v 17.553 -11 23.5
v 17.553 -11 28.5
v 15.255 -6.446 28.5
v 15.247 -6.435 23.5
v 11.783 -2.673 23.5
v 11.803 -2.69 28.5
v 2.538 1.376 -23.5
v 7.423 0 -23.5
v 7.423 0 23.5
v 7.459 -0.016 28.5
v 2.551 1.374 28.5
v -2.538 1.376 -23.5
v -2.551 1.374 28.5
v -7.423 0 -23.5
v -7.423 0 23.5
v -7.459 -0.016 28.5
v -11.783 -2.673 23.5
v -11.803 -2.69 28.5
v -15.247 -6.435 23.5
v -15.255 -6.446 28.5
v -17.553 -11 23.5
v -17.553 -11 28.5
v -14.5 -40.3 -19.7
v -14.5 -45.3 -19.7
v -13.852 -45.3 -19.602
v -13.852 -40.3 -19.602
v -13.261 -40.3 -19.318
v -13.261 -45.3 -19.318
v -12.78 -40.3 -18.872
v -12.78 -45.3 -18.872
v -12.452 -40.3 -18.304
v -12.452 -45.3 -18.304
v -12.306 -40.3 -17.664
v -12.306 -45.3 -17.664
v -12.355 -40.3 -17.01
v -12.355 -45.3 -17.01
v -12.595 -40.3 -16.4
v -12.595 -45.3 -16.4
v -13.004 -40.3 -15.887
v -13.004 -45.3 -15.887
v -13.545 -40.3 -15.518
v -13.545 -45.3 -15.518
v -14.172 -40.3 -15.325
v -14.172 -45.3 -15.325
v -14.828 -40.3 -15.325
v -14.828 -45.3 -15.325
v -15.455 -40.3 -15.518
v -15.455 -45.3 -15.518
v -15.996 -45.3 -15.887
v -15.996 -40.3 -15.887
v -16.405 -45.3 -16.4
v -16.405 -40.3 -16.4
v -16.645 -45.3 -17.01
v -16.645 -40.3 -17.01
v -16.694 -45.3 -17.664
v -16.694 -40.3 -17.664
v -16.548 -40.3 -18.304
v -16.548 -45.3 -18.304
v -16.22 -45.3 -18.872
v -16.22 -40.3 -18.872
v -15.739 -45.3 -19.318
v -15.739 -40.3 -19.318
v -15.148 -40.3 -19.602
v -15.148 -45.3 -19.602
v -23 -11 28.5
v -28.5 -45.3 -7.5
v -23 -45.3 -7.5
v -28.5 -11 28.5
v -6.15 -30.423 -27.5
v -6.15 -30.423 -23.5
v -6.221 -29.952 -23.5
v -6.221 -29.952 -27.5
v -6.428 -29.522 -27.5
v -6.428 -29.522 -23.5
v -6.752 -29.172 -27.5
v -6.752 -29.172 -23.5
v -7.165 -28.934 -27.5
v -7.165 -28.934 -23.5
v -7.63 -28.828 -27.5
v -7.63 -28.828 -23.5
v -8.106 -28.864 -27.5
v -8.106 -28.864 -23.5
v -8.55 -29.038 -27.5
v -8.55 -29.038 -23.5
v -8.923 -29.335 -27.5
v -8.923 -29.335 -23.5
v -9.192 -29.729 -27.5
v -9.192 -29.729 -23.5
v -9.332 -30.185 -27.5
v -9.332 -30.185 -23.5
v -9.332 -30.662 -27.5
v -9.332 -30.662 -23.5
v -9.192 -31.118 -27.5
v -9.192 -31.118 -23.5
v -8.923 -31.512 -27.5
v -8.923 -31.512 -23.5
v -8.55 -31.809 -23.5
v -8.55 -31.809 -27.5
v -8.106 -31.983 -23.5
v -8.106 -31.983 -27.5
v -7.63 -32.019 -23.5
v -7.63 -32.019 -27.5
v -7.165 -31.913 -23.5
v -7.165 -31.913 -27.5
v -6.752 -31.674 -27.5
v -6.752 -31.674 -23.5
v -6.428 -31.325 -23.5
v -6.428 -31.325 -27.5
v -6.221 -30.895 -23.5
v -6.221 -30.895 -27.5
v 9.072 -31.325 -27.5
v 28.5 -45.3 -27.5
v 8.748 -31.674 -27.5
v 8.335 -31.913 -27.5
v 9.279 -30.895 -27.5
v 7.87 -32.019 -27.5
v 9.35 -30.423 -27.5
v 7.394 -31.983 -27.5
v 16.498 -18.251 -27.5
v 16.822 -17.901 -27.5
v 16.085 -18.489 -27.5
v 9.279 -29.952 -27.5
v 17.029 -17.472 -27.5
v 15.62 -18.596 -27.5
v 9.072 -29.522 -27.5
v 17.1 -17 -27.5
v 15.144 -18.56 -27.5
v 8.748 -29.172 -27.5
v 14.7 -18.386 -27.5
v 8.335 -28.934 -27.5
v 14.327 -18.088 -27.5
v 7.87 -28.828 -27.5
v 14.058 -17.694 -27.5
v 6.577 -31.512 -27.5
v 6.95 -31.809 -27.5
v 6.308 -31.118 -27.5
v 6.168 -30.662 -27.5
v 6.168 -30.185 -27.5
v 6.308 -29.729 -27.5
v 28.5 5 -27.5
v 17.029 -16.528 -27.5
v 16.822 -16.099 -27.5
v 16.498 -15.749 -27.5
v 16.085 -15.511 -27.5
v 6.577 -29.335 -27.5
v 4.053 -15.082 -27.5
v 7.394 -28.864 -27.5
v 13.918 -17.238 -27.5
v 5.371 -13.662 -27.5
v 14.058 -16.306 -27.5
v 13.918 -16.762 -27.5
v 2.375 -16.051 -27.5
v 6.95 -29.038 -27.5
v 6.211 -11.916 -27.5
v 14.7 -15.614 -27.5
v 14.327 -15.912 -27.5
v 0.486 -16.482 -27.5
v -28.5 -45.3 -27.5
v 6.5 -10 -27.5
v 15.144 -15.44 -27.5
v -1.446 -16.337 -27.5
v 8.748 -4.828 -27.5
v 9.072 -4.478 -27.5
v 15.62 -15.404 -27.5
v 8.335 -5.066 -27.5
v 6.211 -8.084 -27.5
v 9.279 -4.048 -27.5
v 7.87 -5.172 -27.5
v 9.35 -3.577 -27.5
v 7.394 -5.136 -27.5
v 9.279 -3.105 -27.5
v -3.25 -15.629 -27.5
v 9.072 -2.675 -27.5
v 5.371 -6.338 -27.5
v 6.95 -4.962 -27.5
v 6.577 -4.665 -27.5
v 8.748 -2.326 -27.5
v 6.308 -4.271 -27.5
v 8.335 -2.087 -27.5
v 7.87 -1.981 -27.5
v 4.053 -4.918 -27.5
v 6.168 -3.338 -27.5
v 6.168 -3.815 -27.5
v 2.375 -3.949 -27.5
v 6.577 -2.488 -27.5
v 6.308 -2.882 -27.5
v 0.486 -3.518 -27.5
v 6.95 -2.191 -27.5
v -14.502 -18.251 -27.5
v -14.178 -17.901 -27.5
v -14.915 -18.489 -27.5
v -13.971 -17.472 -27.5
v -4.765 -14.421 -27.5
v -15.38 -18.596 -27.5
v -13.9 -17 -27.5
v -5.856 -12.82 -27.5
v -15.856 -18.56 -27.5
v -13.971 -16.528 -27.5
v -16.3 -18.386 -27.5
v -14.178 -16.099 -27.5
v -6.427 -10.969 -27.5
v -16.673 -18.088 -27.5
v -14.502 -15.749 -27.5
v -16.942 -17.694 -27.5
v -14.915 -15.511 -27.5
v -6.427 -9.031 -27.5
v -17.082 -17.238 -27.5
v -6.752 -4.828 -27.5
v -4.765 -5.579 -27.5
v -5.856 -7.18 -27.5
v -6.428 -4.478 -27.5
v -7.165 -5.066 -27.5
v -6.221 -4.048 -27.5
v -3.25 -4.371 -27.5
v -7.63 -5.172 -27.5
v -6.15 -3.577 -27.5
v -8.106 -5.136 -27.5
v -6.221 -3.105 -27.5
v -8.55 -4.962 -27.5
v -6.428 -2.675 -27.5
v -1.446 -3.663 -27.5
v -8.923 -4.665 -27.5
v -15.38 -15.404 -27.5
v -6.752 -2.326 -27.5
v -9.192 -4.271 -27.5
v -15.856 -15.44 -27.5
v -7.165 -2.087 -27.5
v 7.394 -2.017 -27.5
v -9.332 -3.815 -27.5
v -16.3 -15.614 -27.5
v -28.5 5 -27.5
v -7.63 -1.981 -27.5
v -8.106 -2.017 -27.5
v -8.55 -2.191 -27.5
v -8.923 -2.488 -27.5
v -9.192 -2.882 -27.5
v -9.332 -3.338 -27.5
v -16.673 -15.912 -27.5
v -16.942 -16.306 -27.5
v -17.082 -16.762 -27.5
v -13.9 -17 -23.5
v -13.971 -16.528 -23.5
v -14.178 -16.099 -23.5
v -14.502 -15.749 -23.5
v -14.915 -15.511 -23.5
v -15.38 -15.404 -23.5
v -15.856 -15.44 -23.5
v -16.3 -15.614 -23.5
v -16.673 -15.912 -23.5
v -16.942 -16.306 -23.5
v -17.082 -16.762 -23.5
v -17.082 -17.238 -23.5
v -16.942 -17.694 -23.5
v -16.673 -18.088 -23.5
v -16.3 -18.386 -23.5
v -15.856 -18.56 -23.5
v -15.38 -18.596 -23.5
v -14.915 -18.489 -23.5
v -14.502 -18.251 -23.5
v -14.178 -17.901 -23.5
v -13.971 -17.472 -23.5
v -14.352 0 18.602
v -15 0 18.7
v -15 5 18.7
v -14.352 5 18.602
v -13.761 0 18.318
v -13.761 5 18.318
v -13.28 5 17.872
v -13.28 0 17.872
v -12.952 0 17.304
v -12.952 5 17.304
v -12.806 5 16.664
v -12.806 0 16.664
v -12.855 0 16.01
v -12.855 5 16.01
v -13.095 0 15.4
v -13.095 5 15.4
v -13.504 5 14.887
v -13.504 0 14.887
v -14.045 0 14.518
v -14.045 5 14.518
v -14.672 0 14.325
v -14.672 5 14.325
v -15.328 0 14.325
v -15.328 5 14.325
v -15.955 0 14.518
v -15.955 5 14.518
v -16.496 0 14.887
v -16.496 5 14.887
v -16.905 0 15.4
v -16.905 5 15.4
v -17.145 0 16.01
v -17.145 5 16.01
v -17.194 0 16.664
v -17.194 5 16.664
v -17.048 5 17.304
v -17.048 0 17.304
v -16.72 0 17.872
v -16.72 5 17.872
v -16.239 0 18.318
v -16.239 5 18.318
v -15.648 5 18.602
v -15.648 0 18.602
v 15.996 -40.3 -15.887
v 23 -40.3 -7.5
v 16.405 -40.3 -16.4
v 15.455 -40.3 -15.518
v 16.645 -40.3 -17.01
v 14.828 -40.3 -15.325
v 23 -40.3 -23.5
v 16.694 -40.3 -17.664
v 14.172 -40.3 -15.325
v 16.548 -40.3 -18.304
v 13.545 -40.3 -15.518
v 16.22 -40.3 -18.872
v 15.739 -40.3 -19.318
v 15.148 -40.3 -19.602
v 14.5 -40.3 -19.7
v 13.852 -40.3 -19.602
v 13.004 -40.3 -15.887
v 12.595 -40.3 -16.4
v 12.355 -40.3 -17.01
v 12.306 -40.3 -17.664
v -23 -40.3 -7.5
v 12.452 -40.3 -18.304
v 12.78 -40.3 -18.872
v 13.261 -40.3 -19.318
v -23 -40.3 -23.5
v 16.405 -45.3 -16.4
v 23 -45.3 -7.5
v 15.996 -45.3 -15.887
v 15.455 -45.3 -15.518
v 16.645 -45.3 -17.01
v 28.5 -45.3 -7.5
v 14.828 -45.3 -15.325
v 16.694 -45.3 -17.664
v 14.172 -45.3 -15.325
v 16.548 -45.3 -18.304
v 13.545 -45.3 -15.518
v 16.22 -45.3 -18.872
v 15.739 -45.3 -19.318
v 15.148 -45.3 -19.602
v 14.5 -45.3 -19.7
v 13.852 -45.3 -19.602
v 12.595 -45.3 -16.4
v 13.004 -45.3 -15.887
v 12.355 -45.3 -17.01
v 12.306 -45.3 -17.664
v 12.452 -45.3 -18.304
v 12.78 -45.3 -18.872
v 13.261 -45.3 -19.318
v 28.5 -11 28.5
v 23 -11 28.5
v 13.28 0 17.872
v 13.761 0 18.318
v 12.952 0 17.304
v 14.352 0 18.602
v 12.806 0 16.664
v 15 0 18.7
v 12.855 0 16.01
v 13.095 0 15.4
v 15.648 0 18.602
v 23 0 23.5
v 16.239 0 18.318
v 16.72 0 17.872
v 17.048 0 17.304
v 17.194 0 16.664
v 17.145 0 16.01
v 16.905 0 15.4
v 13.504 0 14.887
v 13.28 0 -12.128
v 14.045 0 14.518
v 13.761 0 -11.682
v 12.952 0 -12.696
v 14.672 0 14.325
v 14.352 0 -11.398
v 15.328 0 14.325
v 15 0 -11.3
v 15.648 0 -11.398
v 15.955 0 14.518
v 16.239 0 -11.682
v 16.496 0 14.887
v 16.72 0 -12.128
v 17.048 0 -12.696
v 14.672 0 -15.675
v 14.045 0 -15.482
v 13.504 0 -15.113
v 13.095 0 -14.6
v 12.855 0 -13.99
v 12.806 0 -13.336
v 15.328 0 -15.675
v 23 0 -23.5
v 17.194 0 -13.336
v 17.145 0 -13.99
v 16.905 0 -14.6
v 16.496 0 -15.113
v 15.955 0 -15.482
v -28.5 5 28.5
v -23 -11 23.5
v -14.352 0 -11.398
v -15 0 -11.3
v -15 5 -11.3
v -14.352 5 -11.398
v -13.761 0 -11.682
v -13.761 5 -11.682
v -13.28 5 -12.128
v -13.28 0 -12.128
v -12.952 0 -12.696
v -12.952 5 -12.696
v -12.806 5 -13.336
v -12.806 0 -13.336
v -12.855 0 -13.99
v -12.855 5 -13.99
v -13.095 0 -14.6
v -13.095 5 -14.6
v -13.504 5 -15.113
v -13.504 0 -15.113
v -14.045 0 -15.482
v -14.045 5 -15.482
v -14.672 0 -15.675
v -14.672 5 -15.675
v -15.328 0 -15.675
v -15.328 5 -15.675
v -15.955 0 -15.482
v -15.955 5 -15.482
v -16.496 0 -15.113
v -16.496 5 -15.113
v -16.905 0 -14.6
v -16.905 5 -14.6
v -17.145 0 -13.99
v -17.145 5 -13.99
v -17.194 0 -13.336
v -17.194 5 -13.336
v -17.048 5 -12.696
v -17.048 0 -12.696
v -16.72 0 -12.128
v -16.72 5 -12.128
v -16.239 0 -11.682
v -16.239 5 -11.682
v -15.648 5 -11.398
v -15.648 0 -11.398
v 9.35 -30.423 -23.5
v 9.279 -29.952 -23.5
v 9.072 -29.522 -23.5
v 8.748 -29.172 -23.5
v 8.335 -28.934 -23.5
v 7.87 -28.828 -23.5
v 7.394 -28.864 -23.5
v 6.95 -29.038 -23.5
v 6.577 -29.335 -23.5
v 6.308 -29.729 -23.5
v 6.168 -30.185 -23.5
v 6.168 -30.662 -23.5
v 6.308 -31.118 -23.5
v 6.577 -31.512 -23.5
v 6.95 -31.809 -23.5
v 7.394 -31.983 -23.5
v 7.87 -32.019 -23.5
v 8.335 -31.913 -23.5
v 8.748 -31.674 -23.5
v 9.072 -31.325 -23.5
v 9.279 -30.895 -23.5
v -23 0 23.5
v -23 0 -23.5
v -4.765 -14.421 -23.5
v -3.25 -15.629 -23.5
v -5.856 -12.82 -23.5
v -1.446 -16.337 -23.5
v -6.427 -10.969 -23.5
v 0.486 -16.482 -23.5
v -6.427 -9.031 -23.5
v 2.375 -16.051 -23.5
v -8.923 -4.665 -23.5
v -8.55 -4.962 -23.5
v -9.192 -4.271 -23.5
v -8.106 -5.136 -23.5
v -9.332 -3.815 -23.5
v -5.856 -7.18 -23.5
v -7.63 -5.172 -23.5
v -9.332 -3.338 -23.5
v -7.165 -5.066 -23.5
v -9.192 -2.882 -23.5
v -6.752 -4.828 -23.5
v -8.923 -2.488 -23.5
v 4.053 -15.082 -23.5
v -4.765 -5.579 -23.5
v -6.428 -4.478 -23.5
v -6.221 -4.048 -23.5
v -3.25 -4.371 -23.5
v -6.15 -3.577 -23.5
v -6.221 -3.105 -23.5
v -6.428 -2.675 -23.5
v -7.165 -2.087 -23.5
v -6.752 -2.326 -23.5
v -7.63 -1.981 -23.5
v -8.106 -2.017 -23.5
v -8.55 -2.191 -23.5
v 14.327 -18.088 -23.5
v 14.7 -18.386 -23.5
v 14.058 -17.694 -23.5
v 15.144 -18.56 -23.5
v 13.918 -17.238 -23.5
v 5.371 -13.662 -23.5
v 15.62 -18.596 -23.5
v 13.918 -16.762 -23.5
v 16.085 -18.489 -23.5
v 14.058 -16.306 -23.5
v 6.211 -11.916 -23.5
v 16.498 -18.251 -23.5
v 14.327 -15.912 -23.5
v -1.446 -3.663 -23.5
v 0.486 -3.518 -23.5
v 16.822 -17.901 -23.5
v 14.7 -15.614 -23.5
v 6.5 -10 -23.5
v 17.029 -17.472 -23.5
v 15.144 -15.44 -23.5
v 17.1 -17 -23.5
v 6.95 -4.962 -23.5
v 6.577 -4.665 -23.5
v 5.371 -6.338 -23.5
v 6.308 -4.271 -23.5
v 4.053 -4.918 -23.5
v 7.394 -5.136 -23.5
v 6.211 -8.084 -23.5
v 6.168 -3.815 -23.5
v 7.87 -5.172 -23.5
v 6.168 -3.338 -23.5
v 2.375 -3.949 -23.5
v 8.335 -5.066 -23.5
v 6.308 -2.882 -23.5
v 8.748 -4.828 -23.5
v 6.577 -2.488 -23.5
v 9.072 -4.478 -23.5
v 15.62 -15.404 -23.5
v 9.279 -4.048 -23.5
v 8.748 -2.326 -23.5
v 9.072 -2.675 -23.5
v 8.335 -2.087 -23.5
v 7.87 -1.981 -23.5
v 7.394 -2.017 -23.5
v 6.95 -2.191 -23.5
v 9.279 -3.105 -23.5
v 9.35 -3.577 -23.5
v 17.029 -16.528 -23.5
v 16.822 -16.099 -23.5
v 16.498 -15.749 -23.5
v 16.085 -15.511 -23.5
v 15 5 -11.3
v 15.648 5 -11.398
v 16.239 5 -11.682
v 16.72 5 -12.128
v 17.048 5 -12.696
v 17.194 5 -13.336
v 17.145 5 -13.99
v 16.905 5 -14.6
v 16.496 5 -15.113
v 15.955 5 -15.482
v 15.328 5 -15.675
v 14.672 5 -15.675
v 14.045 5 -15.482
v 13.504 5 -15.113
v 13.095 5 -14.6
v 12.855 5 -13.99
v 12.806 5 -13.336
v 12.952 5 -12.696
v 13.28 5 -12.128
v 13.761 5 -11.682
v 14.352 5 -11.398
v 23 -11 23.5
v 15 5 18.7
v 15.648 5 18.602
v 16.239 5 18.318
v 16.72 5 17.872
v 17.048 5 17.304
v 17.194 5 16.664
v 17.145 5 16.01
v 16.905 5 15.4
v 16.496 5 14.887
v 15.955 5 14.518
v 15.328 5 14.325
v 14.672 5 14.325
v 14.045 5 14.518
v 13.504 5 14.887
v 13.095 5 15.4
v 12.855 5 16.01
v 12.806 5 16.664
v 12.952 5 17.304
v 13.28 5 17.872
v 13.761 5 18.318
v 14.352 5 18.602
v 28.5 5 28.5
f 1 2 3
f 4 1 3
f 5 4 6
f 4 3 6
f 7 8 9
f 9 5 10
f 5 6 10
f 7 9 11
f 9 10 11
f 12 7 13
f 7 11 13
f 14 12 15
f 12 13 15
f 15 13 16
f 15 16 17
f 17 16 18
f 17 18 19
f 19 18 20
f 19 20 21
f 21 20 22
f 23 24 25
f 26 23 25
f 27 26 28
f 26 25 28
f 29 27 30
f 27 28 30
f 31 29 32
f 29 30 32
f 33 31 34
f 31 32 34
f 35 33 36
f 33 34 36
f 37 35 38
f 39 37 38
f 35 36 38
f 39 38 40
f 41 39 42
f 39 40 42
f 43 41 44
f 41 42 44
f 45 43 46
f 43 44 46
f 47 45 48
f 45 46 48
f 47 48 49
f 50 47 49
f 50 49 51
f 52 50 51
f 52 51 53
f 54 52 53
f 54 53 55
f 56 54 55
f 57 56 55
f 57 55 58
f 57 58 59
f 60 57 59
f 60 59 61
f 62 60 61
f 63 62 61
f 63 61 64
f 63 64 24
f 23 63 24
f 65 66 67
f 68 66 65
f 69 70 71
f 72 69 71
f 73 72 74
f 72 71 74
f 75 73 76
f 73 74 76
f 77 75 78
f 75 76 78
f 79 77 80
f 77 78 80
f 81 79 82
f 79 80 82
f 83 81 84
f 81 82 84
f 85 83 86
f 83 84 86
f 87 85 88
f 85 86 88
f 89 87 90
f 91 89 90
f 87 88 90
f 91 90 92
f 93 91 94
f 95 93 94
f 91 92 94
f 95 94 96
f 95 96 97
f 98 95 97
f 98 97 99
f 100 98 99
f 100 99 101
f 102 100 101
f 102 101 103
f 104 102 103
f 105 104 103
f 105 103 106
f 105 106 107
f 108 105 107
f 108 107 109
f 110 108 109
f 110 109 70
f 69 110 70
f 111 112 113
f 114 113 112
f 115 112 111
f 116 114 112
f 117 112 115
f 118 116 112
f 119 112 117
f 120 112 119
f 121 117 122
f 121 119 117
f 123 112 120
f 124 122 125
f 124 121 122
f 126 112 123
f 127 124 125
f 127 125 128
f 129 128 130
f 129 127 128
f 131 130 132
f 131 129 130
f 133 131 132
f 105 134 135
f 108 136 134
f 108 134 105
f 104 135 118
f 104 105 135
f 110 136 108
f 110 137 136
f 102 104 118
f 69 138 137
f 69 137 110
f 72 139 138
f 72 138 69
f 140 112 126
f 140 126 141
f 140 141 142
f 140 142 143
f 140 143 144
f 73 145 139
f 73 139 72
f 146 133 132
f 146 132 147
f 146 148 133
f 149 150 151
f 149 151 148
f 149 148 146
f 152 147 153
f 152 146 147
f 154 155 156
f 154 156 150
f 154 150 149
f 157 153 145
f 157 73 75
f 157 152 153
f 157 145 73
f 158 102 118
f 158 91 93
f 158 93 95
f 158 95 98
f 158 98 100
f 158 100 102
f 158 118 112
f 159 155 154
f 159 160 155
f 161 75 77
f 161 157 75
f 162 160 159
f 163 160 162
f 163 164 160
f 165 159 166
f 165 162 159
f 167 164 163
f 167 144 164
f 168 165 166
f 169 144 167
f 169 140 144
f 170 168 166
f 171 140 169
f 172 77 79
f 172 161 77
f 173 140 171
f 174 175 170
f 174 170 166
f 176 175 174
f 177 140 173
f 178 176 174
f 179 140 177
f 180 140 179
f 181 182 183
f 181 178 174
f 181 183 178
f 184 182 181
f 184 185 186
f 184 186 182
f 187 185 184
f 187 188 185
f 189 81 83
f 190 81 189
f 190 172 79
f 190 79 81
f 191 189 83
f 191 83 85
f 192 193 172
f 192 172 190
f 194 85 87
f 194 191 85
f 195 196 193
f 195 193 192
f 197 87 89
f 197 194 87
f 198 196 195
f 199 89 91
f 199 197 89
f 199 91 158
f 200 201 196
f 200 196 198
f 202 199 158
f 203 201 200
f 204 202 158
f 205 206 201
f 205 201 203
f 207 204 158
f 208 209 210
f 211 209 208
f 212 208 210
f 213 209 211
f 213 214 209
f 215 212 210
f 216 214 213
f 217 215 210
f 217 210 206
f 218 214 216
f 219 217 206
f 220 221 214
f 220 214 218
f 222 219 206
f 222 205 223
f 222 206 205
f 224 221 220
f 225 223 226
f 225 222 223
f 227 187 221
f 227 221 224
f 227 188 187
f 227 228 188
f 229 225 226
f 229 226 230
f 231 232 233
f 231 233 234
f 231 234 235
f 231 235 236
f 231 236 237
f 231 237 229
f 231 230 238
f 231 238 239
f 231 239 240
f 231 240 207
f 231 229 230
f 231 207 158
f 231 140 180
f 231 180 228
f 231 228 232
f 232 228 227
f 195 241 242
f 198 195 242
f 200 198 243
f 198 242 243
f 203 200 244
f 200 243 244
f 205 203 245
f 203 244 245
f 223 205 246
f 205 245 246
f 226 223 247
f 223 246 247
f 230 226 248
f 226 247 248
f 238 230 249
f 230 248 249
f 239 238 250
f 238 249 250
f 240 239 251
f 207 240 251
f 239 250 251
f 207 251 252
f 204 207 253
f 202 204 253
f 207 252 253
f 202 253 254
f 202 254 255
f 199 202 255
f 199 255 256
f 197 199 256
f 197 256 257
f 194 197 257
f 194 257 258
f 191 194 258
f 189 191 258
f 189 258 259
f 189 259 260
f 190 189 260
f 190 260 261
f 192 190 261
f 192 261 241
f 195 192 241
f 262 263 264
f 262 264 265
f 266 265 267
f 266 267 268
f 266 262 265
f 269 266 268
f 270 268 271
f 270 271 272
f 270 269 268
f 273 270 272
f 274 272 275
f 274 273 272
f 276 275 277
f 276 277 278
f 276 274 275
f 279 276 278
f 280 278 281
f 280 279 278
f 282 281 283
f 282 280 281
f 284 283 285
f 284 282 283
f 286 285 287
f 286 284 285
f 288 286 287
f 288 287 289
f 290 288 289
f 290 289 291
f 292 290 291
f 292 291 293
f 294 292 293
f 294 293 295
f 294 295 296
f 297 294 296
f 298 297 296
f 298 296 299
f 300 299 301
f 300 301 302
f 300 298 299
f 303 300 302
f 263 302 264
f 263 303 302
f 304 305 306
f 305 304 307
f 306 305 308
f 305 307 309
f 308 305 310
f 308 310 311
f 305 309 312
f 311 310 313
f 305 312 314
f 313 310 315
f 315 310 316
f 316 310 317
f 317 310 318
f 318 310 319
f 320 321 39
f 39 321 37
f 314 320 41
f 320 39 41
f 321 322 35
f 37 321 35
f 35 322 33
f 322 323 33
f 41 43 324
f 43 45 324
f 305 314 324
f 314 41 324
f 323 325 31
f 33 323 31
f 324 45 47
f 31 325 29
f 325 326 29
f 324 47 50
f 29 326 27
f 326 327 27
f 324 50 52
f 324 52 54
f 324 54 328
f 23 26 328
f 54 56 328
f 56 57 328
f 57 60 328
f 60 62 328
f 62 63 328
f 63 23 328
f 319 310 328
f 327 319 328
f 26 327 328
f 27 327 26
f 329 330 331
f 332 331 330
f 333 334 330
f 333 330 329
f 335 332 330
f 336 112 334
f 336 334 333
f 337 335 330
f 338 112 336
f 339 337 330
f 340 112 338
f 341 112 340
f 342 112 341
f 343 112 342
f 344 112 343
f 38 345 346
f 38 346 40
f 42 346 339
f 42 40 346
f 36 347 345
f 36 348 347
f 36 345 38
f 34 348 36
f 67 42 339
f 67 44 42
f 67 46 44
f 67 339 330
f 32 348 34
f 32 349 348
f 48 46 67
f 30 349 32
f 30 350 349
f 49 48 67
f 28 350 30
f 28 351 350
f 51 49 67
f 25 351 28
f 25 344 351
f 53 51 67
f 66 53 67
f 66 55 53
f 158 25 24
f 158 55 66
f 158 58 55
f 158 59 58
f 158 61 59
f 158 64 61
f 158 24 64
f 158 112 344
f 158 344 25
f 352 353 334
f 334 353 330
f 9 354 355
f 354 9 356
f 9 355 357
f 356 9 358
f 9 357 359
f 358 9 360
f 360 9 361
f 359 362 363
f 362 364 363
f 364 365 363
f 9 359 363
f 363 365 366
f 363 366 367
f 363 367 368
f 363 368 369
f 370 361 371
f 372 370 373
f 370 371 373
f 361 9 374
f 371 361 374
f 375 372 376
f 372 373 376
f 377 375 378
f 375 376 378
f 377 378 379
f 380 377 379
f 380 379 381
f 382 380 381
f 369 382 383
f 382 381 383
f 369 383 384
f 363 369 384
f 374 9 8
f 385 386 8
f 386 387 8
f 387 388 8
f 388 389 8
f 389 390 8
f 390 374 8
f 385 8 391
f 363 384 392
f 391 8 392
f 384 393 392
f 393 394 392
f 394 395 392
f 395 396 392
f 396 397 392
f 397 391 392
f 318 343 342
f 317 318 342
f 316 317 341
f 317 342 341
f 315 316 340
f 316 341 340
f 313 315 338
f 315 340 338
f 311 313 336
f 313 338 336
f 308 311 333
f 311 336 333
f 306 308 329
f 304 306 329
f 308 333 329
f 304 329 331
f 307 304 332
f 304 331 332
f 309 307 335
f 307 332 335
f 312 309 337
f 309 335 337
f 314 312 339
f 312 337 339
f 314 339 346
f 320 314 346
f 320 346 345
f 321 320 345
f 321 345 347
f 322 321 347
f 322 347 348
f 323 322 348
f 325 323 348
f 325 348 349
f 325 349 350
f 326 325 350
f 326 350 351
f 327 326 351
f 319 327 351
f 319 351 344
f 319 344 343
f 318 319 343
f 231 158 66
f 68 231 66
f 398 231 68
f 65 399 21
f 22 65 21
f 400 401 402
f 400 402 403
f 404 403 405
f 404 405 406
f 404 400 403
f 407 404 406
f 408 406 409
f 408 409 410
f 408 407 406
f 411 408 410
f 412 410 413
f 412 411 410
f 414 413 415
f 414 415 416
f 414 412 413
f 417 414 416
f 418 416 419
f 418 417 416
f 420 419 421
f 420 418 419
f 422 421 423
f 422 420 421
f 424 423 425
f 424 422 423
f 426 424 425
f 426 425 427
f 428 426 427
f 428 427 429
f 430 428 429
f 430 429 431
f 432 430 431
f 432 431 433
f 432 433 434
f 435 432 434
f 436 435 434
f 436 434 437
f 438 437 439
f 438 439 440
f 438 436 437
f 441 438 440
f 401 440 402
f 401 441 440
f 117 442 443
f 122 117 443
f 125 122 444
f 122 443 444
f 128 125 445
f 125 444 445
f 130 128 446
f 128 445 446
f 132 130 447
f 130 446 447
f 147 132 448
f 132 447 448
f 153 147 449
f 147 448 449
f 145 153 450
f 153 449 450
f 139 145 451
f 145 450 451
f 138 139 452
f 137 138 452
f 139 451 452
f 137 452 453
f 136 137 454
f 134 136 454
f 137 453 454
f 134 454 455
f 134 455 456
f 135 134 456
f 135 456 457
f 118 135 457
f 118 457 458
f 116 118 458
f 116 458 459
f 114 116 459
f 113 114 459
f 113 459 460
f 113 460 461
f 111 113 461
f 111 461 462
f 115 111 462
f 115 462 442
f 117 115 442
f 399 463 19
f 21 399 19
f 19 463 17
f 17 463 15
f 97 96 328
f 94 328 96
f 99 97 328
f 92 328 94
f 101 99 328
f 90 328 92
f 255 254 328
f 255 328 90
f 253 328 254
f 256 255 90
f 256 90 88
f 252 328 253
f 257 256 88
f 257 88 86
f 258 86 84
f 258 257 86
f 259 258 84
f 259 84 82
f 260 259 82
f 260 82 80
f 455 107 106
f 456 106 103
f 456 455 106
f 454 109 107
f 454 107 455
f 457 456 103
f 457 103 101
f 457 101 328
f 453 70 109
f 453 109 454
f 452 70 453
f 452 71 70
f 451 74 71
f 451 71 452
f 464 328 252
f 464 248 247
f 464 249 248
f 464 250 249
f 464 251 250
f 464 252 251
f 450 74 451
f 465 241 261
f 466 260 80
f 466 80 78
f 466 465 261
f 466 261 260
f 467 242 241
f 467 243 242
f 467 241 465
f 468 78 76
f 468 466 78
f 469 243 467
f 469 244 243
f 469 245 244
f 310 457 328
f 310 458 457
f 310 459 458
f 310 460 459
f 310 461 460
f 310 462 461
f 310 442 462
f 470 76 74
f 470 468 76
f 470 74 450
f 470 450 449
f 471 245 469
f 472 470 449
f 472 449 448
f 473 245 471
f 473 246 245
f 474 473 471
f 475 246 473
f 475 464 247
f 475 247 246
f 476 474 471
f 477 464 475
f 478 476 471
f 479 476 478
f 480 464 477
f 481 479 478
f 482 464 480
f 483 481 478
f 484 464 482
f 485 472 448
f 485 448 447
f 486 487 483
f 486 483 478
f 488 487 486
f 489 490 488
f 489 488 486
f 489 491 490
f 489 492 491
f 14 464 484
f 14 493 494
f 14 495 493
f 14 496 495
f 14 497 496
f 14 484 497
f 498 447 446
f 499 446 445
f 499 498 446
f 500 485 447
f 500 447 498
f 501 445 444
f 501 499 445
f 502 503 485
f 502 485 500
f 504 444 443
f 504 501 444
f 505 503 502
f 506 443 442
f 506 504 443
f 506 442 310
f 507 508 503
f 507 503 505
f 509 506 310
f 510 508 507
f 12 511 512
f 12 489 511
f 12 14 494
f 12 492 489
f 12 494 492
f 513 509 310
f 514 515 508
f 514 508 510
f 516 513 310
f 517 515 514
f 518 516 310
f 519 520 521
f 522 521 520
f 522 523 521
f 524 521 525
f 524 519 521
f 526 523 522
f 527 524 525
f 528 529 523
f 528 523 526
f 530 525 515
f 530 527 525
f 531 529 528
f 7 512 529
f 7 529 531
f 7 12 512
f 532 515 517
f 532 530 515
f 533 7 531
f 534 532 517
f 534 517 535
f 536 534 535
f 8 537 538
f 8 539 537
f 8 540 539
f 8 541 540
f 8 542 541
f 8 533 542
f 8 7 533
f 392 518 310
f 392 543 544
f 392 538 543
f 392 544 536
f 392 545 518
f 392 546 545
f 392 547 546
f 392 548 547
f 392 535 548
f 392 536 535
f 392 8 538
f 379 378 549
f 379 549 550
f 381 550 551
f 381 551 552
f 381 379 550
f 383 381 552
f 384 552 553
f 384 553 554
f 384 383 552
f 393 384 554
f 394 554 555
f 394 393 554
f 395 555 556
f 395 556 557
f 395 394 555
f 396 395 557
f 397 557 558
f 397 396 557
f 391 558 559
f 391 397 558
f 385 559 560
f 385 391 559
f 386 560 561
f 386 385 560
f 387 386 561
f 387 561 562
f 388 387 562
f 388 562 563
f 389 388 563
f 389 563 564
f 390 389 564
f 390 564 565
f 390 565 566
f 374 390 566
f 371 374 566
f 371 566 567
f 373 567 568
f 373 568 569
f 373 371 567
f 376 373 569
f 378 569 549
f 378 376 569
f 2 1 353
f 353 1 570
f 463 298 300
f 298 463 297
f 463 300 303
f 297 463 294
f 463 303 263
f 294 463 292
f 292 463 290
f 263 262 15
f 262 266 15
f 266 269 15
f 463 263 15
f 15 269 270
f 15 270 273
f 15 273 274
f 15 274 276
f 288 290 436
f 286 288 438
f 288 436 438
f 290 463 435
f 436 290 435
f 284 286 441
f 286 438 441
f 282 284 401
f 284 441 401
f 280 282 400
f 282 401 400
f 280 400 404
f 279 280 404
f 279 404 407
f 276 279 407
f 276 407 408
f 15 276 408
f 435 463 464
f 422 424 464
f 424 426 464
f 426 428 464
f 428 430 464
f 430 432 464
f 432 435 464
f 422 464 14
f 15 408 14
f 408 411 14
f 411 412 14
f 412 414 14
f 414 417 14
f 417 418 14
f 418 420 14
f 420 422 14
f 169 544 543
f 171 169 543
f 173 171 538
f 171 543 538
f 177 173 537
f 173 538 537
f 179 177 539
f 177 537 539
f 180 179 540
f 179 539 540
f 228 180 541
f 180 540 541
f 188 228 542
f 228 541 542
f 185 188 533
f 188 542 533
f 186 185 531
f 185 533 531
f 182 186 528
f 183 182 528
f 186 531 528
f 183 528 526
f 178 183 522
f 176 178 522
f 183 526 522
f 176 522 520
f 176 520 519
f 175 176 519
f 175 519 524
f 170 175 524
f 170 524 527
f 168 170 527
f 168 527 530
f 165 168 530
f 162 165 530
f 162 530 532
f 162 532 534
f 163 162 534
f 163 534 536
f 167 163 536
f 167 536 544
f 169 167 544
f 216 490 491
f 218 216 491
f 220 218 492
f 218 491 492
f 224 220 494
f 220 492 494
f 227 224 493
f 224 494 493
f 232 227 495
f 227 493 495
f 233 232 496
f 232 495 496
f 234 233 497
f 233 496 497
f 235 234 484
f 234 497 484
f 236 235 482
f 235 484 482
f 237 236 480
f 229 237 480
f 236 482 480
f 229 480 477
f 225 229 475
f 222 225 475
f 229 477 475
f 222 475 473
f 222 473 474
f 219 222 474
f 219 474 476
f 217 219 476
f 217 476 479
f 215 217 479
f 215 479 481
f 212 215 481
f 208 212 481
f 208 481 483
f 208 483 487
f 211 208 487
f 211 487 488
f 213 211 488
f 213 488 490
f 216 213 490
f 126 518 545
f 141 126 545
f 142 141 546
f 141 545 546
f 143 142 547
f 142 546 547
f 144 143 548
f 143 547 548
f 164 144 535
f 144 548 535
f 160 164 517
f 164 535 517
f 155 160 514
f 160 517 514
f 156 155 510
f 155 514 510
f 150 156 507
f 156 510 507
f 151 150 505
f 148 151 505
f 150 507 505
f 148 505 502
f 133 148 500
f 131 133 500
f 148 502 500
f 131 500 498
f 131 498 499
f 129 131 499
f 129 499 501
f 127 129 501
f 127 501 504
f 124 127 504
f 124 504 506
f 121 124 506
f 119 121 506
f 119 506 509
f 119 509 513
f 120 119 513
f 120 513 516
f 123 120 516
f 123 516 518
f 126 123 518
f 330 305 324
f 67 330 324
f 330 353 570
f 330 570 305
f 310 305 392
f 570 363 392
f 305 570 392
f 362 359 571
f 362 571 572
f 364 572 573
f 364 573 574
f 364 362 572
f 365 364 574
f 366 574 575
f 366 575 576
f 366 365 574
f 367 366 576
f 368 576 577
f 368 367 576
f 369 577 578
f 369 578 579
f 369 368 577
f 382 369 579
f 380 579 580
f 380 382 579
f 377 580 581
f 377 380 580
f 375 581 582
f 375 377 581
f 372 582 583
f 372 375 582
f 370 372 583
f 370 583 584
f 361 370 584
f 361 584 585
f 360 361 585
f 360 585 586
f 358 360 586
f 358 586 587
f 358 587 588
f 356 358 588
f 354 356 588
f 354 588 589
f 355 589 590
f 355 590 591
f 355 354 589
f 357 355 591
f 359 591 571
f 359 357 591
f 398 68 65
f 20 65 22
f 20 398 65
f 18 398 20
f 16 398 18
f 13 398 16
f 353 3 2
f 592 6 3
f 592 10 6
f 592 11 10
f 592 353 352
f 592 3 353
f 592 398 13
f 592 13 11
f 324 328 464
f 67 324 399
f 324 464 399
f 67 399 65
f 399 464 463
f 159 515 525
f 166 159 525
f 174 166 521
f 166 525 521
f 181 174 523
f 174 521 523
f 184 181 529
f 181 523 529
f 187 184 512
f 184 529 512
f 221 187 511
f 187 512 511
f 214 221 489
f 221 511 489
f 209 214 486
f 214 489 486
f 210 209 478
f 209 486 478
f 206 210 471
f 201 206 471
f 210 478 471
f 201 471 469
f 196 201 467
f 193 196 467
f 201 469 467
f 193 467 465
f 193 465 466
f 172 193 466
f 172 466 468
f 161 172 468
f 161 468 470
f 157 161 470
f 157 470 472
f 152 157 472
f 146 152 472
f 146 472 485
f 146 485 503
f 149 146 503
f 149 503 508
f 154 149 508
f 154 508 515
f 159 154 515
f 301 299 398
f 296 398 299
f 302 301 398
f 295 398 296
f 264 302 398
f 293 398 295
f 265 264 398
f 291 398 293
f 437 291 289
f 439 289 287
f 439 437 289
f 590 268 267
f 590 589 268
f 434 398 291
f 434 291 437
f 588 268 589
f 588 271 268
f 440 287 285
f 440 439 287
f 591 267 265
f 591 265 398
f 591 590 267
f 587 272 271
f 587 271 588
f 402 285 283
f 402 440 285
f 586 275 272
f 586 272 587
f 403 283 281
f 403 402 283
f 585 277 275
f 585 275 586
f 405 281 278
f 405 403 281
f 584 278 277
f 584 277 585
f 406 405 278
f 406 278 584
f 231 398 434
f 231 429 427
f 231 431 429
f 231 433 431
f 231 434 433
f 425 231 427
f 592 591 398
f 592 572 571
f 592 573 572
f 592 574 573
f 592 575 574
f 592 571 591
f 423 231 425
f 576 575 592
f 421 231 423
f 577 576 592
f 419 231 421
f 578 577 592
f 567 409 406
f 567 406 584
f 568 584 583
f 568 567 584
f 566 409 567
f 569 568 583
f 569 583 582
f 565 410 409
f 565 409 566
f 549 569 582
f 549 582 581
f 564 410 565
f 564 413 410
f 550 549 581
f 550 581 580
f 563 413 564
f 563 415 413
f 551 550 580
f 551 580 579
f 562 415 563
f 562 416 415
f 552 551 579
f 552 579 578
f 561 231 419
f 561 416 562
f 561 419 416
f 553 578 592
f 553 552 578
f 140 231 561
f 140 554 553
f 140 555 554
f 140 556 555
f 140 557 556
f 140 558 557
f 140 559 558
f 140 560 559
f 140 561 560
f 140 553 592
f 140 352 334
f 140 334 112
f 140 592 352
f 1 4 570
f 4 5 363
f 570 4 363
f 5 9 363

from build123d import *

# Parameters (mm, degrees)
ESQUISSE1_W             = 46
ESQUISSE1_H             = 47
ESQUISSE1_R             = 2.2
BOSS_EXTRU_1_DEPTH      = 5
BOSS_EXTRU_2_START      = -5
BOSS_EXTRU_2_DEPTH      = 45.3
ESQUISSE3_R             = 6.5
ESQUISSE3_R_2           = 1.6
ENL_V_MAT_EXTRU_1_DEPTH = 15
ESQUISSE4_W             = 57
ESQUISSE4_H             = 5
BOSS_EXTRU_3_DEPTH      = 20
ESQUISSE7_W             = 57
ESQUISSE7_H             = 5
BOSS_EXTRU_4_DEPTH      = 16
ESQUISSE8_R             = 18.55
ENL_V_MAT_EXTRU_3_DEPTH = 52
ENL_V_MAT_EXTRU_4_DEPTH = 10
ENL_V_MAT_EXTRU_5_DEPTH = 10
BOSS_EXTRU_6_DEPTH      = 5.5
BOSS_EXTRU_7_START      = -5.5
BOSS_EXTRU_7_DEPTH      = 5.5
ESQUISSE14_R            = 2.2
ENL_V_MAT_EXTRU_6_DEPTH = 10


with BuildPart() as part:
    # Esquisse1 → Boss.-Extru.1 (new body)
    with BuildSketch(Plane(origin=(0, 0, 0), x_dir=(1, 0, 0), z_dir=(0, 1, 0))):
        Rectangle(ESQUISSE1_W, ESQUISSE1_H)
        with Locations(Location((-15, 13.5, 0), (0, 0, 270))):
            Circle(ESQUISSE1_R, mode=Mode.SUBTRACT)
        with Locations(Location((-15, -16.5, 0), (0, 0, 270))):
            Circle(ESQUISSE1_R, mode=Mode.SUBTRACT)
        with Locations(Location((15, -16.5, 0), (0, 0, 270))):
            Circle(ESQUISSE1_R, mode=Mode.SUBTRACT)
        with Locations(Location((15, 13.5, 0), (0, 0, 270))):
            Circle(ESQUISSE1_R, mode=Mode.SUBTRACT)
    extrude(amount=BOSS_EXTRU_1_DEPTH)

    # Esquisse2 → Boss.-Extru.2 (add)
    with BuildSketch(Plane.XZ.offset(BOSS_EXTRU_2_START)):
        Polygon((-28.5, -27.5), (-28.5, 23.5), (-23, 23.5), (-23, -23.5), (23, -23.5), (23, 23.5), (28.5, 23.5), (28.5, -27.5), align=None)
    extrude(amount=BOSS_EXTRU_2_DEPTH)

    # Esquisse3 → Enlèv. mat.-Extru.1 (cut)
    with BuildSketch(Plane.XY.offset(-23.5)):
        with Locations((0, -10)):
            Circle(ESQUISSE3_R)
        with Locations((7.75, -30.423393759)):
            Circle(ESQUISSE3_R_2)
        with Locations((-7.75, -30.423393759)):
            Circle(ESQUISSE3_R_2)
        with Locations((-15.5, -17)):
            Circle(ESQUISSE3_R_2)
        with Locations((-7.75, -3.576606241)):
            Circle(ESQUISSE3_R_2)
        with Locations((7.75, -3.576606241)):
            Circle(ESQUISSE3_R_2)
        with Locations((15.5, -17)):
            Circle(ESQUISSE3_R_2)
    extrude(amount=-ENL_V_MAT_EXTRU_1_DEPTH, mode=Mode.SUBTRACT)

    # Esquisse4 → Boss.-Extru.3 (add)
    with BuildSketch(Plane(origin=(0, 0, -27.5), x_dir=(-1, 0, 0), z_dir=(0, 0, -1))):
        with Locations((0, -42.8)):
            Rectangle(ESQUISSE4_W, ESQUISSE4_H)
    extrude(amount=-BOSS_EXTRU_3_DEPTH)

    # Esquisse7 → Boss.-Extru.4 (add)
    with BuildSketch(Plane(origin=(0, 5, 0), x_dir=(1, 0, 0), z_dir=(0, 1, 0))):
        with Locations((0, -26)):
            Rectangle(ESQUISSE7_W, ESQUISSE7_H)
    extrude(amount=-BOSS_EXTRU_4_DEPTH)

    # Esquisse8 → Enlèv. mat.-Extru.3 (cut)
    with BuildSketch(Plane.XY.offset(28.5)):
        with Locations((0, -17)):
            Circle(ESQUISSE8_R)
    extrude(amount=-ENL_V_MAT_EXTRU_3_DEPTH, mode=Mode.SUBTRACT)

    # Esquisse10 → Enlèv. mat.-Extru.4 (cut)
    with BuildSketch(Plane(origin=(28.5, 0, 0), x_dir=(0, 0, -1), z_dir=(1, 0, 0))):
        Polygon((-23.5, -11), (7.5, -40.3), (-23.5, -40.3), align=None)
    extrude(amount=-ENL_V_MAT_EXTRU_4_DEPTH, mode=Mode.SUBTRACT)

    # Esquisse11 → Enlèv. mat.-Extru.5 (cut)
    with BuildSketch(Plane.ZY.offset(28.5)):
        Polygon((23.5, -11), (-7.5, -40.3), (23.5, -40.3), align=None)
    extrude(amount=-ENL_V_MAT_EXTRU_5_DEPTH, mode=Mode.SUBTRACT)

    # Esquisse12 → Boss.-Extru.6 (add)
    with BuildSketch(Plane.ZY.offset(28.5)):
        Polygon((-7.5, -45.3), (28.5, -11), (23.5, -11), (-7.5, -40.3), align=None)
    extrude(amount=-BOSS_EXTRU_6_DEPTH)

    # Esquisse13 → Boss.-Extru.7 (add)
    with BuildSketch(Plane(origin=(28.5, 0, 0), x_dir=(0, 0, -1), z_dir=(1, 0, 0)).offset(BOSS_EXTRU_7_START)):
        Polygon((-28.5, -11), (7.5, -45.3), (7.5, -40.3), (-23.5, -11), align=None)
    extrude(amount=BOSS_EXTRU_7_DEPTH)

    # Esquisse14 → Enlèv. mat.-Extru.6 (cut)
    with BuildSketch(Plane.XZ.offset(45.3)):
        with Locations(Location((-14.5, -17.5, 0), (0, 0, 270))):
            Circle(ESQUISSE14_R)
        with Locations(Location((14.5, -17.5, 0), (0, 0, 270))):
            Circle(ESQUISSE14_R)
    extrude(amount=-ENL_V_MAT_EXTRU_6_DEPTH, mode=Mode.SUBTRACT)


solid = part.part
